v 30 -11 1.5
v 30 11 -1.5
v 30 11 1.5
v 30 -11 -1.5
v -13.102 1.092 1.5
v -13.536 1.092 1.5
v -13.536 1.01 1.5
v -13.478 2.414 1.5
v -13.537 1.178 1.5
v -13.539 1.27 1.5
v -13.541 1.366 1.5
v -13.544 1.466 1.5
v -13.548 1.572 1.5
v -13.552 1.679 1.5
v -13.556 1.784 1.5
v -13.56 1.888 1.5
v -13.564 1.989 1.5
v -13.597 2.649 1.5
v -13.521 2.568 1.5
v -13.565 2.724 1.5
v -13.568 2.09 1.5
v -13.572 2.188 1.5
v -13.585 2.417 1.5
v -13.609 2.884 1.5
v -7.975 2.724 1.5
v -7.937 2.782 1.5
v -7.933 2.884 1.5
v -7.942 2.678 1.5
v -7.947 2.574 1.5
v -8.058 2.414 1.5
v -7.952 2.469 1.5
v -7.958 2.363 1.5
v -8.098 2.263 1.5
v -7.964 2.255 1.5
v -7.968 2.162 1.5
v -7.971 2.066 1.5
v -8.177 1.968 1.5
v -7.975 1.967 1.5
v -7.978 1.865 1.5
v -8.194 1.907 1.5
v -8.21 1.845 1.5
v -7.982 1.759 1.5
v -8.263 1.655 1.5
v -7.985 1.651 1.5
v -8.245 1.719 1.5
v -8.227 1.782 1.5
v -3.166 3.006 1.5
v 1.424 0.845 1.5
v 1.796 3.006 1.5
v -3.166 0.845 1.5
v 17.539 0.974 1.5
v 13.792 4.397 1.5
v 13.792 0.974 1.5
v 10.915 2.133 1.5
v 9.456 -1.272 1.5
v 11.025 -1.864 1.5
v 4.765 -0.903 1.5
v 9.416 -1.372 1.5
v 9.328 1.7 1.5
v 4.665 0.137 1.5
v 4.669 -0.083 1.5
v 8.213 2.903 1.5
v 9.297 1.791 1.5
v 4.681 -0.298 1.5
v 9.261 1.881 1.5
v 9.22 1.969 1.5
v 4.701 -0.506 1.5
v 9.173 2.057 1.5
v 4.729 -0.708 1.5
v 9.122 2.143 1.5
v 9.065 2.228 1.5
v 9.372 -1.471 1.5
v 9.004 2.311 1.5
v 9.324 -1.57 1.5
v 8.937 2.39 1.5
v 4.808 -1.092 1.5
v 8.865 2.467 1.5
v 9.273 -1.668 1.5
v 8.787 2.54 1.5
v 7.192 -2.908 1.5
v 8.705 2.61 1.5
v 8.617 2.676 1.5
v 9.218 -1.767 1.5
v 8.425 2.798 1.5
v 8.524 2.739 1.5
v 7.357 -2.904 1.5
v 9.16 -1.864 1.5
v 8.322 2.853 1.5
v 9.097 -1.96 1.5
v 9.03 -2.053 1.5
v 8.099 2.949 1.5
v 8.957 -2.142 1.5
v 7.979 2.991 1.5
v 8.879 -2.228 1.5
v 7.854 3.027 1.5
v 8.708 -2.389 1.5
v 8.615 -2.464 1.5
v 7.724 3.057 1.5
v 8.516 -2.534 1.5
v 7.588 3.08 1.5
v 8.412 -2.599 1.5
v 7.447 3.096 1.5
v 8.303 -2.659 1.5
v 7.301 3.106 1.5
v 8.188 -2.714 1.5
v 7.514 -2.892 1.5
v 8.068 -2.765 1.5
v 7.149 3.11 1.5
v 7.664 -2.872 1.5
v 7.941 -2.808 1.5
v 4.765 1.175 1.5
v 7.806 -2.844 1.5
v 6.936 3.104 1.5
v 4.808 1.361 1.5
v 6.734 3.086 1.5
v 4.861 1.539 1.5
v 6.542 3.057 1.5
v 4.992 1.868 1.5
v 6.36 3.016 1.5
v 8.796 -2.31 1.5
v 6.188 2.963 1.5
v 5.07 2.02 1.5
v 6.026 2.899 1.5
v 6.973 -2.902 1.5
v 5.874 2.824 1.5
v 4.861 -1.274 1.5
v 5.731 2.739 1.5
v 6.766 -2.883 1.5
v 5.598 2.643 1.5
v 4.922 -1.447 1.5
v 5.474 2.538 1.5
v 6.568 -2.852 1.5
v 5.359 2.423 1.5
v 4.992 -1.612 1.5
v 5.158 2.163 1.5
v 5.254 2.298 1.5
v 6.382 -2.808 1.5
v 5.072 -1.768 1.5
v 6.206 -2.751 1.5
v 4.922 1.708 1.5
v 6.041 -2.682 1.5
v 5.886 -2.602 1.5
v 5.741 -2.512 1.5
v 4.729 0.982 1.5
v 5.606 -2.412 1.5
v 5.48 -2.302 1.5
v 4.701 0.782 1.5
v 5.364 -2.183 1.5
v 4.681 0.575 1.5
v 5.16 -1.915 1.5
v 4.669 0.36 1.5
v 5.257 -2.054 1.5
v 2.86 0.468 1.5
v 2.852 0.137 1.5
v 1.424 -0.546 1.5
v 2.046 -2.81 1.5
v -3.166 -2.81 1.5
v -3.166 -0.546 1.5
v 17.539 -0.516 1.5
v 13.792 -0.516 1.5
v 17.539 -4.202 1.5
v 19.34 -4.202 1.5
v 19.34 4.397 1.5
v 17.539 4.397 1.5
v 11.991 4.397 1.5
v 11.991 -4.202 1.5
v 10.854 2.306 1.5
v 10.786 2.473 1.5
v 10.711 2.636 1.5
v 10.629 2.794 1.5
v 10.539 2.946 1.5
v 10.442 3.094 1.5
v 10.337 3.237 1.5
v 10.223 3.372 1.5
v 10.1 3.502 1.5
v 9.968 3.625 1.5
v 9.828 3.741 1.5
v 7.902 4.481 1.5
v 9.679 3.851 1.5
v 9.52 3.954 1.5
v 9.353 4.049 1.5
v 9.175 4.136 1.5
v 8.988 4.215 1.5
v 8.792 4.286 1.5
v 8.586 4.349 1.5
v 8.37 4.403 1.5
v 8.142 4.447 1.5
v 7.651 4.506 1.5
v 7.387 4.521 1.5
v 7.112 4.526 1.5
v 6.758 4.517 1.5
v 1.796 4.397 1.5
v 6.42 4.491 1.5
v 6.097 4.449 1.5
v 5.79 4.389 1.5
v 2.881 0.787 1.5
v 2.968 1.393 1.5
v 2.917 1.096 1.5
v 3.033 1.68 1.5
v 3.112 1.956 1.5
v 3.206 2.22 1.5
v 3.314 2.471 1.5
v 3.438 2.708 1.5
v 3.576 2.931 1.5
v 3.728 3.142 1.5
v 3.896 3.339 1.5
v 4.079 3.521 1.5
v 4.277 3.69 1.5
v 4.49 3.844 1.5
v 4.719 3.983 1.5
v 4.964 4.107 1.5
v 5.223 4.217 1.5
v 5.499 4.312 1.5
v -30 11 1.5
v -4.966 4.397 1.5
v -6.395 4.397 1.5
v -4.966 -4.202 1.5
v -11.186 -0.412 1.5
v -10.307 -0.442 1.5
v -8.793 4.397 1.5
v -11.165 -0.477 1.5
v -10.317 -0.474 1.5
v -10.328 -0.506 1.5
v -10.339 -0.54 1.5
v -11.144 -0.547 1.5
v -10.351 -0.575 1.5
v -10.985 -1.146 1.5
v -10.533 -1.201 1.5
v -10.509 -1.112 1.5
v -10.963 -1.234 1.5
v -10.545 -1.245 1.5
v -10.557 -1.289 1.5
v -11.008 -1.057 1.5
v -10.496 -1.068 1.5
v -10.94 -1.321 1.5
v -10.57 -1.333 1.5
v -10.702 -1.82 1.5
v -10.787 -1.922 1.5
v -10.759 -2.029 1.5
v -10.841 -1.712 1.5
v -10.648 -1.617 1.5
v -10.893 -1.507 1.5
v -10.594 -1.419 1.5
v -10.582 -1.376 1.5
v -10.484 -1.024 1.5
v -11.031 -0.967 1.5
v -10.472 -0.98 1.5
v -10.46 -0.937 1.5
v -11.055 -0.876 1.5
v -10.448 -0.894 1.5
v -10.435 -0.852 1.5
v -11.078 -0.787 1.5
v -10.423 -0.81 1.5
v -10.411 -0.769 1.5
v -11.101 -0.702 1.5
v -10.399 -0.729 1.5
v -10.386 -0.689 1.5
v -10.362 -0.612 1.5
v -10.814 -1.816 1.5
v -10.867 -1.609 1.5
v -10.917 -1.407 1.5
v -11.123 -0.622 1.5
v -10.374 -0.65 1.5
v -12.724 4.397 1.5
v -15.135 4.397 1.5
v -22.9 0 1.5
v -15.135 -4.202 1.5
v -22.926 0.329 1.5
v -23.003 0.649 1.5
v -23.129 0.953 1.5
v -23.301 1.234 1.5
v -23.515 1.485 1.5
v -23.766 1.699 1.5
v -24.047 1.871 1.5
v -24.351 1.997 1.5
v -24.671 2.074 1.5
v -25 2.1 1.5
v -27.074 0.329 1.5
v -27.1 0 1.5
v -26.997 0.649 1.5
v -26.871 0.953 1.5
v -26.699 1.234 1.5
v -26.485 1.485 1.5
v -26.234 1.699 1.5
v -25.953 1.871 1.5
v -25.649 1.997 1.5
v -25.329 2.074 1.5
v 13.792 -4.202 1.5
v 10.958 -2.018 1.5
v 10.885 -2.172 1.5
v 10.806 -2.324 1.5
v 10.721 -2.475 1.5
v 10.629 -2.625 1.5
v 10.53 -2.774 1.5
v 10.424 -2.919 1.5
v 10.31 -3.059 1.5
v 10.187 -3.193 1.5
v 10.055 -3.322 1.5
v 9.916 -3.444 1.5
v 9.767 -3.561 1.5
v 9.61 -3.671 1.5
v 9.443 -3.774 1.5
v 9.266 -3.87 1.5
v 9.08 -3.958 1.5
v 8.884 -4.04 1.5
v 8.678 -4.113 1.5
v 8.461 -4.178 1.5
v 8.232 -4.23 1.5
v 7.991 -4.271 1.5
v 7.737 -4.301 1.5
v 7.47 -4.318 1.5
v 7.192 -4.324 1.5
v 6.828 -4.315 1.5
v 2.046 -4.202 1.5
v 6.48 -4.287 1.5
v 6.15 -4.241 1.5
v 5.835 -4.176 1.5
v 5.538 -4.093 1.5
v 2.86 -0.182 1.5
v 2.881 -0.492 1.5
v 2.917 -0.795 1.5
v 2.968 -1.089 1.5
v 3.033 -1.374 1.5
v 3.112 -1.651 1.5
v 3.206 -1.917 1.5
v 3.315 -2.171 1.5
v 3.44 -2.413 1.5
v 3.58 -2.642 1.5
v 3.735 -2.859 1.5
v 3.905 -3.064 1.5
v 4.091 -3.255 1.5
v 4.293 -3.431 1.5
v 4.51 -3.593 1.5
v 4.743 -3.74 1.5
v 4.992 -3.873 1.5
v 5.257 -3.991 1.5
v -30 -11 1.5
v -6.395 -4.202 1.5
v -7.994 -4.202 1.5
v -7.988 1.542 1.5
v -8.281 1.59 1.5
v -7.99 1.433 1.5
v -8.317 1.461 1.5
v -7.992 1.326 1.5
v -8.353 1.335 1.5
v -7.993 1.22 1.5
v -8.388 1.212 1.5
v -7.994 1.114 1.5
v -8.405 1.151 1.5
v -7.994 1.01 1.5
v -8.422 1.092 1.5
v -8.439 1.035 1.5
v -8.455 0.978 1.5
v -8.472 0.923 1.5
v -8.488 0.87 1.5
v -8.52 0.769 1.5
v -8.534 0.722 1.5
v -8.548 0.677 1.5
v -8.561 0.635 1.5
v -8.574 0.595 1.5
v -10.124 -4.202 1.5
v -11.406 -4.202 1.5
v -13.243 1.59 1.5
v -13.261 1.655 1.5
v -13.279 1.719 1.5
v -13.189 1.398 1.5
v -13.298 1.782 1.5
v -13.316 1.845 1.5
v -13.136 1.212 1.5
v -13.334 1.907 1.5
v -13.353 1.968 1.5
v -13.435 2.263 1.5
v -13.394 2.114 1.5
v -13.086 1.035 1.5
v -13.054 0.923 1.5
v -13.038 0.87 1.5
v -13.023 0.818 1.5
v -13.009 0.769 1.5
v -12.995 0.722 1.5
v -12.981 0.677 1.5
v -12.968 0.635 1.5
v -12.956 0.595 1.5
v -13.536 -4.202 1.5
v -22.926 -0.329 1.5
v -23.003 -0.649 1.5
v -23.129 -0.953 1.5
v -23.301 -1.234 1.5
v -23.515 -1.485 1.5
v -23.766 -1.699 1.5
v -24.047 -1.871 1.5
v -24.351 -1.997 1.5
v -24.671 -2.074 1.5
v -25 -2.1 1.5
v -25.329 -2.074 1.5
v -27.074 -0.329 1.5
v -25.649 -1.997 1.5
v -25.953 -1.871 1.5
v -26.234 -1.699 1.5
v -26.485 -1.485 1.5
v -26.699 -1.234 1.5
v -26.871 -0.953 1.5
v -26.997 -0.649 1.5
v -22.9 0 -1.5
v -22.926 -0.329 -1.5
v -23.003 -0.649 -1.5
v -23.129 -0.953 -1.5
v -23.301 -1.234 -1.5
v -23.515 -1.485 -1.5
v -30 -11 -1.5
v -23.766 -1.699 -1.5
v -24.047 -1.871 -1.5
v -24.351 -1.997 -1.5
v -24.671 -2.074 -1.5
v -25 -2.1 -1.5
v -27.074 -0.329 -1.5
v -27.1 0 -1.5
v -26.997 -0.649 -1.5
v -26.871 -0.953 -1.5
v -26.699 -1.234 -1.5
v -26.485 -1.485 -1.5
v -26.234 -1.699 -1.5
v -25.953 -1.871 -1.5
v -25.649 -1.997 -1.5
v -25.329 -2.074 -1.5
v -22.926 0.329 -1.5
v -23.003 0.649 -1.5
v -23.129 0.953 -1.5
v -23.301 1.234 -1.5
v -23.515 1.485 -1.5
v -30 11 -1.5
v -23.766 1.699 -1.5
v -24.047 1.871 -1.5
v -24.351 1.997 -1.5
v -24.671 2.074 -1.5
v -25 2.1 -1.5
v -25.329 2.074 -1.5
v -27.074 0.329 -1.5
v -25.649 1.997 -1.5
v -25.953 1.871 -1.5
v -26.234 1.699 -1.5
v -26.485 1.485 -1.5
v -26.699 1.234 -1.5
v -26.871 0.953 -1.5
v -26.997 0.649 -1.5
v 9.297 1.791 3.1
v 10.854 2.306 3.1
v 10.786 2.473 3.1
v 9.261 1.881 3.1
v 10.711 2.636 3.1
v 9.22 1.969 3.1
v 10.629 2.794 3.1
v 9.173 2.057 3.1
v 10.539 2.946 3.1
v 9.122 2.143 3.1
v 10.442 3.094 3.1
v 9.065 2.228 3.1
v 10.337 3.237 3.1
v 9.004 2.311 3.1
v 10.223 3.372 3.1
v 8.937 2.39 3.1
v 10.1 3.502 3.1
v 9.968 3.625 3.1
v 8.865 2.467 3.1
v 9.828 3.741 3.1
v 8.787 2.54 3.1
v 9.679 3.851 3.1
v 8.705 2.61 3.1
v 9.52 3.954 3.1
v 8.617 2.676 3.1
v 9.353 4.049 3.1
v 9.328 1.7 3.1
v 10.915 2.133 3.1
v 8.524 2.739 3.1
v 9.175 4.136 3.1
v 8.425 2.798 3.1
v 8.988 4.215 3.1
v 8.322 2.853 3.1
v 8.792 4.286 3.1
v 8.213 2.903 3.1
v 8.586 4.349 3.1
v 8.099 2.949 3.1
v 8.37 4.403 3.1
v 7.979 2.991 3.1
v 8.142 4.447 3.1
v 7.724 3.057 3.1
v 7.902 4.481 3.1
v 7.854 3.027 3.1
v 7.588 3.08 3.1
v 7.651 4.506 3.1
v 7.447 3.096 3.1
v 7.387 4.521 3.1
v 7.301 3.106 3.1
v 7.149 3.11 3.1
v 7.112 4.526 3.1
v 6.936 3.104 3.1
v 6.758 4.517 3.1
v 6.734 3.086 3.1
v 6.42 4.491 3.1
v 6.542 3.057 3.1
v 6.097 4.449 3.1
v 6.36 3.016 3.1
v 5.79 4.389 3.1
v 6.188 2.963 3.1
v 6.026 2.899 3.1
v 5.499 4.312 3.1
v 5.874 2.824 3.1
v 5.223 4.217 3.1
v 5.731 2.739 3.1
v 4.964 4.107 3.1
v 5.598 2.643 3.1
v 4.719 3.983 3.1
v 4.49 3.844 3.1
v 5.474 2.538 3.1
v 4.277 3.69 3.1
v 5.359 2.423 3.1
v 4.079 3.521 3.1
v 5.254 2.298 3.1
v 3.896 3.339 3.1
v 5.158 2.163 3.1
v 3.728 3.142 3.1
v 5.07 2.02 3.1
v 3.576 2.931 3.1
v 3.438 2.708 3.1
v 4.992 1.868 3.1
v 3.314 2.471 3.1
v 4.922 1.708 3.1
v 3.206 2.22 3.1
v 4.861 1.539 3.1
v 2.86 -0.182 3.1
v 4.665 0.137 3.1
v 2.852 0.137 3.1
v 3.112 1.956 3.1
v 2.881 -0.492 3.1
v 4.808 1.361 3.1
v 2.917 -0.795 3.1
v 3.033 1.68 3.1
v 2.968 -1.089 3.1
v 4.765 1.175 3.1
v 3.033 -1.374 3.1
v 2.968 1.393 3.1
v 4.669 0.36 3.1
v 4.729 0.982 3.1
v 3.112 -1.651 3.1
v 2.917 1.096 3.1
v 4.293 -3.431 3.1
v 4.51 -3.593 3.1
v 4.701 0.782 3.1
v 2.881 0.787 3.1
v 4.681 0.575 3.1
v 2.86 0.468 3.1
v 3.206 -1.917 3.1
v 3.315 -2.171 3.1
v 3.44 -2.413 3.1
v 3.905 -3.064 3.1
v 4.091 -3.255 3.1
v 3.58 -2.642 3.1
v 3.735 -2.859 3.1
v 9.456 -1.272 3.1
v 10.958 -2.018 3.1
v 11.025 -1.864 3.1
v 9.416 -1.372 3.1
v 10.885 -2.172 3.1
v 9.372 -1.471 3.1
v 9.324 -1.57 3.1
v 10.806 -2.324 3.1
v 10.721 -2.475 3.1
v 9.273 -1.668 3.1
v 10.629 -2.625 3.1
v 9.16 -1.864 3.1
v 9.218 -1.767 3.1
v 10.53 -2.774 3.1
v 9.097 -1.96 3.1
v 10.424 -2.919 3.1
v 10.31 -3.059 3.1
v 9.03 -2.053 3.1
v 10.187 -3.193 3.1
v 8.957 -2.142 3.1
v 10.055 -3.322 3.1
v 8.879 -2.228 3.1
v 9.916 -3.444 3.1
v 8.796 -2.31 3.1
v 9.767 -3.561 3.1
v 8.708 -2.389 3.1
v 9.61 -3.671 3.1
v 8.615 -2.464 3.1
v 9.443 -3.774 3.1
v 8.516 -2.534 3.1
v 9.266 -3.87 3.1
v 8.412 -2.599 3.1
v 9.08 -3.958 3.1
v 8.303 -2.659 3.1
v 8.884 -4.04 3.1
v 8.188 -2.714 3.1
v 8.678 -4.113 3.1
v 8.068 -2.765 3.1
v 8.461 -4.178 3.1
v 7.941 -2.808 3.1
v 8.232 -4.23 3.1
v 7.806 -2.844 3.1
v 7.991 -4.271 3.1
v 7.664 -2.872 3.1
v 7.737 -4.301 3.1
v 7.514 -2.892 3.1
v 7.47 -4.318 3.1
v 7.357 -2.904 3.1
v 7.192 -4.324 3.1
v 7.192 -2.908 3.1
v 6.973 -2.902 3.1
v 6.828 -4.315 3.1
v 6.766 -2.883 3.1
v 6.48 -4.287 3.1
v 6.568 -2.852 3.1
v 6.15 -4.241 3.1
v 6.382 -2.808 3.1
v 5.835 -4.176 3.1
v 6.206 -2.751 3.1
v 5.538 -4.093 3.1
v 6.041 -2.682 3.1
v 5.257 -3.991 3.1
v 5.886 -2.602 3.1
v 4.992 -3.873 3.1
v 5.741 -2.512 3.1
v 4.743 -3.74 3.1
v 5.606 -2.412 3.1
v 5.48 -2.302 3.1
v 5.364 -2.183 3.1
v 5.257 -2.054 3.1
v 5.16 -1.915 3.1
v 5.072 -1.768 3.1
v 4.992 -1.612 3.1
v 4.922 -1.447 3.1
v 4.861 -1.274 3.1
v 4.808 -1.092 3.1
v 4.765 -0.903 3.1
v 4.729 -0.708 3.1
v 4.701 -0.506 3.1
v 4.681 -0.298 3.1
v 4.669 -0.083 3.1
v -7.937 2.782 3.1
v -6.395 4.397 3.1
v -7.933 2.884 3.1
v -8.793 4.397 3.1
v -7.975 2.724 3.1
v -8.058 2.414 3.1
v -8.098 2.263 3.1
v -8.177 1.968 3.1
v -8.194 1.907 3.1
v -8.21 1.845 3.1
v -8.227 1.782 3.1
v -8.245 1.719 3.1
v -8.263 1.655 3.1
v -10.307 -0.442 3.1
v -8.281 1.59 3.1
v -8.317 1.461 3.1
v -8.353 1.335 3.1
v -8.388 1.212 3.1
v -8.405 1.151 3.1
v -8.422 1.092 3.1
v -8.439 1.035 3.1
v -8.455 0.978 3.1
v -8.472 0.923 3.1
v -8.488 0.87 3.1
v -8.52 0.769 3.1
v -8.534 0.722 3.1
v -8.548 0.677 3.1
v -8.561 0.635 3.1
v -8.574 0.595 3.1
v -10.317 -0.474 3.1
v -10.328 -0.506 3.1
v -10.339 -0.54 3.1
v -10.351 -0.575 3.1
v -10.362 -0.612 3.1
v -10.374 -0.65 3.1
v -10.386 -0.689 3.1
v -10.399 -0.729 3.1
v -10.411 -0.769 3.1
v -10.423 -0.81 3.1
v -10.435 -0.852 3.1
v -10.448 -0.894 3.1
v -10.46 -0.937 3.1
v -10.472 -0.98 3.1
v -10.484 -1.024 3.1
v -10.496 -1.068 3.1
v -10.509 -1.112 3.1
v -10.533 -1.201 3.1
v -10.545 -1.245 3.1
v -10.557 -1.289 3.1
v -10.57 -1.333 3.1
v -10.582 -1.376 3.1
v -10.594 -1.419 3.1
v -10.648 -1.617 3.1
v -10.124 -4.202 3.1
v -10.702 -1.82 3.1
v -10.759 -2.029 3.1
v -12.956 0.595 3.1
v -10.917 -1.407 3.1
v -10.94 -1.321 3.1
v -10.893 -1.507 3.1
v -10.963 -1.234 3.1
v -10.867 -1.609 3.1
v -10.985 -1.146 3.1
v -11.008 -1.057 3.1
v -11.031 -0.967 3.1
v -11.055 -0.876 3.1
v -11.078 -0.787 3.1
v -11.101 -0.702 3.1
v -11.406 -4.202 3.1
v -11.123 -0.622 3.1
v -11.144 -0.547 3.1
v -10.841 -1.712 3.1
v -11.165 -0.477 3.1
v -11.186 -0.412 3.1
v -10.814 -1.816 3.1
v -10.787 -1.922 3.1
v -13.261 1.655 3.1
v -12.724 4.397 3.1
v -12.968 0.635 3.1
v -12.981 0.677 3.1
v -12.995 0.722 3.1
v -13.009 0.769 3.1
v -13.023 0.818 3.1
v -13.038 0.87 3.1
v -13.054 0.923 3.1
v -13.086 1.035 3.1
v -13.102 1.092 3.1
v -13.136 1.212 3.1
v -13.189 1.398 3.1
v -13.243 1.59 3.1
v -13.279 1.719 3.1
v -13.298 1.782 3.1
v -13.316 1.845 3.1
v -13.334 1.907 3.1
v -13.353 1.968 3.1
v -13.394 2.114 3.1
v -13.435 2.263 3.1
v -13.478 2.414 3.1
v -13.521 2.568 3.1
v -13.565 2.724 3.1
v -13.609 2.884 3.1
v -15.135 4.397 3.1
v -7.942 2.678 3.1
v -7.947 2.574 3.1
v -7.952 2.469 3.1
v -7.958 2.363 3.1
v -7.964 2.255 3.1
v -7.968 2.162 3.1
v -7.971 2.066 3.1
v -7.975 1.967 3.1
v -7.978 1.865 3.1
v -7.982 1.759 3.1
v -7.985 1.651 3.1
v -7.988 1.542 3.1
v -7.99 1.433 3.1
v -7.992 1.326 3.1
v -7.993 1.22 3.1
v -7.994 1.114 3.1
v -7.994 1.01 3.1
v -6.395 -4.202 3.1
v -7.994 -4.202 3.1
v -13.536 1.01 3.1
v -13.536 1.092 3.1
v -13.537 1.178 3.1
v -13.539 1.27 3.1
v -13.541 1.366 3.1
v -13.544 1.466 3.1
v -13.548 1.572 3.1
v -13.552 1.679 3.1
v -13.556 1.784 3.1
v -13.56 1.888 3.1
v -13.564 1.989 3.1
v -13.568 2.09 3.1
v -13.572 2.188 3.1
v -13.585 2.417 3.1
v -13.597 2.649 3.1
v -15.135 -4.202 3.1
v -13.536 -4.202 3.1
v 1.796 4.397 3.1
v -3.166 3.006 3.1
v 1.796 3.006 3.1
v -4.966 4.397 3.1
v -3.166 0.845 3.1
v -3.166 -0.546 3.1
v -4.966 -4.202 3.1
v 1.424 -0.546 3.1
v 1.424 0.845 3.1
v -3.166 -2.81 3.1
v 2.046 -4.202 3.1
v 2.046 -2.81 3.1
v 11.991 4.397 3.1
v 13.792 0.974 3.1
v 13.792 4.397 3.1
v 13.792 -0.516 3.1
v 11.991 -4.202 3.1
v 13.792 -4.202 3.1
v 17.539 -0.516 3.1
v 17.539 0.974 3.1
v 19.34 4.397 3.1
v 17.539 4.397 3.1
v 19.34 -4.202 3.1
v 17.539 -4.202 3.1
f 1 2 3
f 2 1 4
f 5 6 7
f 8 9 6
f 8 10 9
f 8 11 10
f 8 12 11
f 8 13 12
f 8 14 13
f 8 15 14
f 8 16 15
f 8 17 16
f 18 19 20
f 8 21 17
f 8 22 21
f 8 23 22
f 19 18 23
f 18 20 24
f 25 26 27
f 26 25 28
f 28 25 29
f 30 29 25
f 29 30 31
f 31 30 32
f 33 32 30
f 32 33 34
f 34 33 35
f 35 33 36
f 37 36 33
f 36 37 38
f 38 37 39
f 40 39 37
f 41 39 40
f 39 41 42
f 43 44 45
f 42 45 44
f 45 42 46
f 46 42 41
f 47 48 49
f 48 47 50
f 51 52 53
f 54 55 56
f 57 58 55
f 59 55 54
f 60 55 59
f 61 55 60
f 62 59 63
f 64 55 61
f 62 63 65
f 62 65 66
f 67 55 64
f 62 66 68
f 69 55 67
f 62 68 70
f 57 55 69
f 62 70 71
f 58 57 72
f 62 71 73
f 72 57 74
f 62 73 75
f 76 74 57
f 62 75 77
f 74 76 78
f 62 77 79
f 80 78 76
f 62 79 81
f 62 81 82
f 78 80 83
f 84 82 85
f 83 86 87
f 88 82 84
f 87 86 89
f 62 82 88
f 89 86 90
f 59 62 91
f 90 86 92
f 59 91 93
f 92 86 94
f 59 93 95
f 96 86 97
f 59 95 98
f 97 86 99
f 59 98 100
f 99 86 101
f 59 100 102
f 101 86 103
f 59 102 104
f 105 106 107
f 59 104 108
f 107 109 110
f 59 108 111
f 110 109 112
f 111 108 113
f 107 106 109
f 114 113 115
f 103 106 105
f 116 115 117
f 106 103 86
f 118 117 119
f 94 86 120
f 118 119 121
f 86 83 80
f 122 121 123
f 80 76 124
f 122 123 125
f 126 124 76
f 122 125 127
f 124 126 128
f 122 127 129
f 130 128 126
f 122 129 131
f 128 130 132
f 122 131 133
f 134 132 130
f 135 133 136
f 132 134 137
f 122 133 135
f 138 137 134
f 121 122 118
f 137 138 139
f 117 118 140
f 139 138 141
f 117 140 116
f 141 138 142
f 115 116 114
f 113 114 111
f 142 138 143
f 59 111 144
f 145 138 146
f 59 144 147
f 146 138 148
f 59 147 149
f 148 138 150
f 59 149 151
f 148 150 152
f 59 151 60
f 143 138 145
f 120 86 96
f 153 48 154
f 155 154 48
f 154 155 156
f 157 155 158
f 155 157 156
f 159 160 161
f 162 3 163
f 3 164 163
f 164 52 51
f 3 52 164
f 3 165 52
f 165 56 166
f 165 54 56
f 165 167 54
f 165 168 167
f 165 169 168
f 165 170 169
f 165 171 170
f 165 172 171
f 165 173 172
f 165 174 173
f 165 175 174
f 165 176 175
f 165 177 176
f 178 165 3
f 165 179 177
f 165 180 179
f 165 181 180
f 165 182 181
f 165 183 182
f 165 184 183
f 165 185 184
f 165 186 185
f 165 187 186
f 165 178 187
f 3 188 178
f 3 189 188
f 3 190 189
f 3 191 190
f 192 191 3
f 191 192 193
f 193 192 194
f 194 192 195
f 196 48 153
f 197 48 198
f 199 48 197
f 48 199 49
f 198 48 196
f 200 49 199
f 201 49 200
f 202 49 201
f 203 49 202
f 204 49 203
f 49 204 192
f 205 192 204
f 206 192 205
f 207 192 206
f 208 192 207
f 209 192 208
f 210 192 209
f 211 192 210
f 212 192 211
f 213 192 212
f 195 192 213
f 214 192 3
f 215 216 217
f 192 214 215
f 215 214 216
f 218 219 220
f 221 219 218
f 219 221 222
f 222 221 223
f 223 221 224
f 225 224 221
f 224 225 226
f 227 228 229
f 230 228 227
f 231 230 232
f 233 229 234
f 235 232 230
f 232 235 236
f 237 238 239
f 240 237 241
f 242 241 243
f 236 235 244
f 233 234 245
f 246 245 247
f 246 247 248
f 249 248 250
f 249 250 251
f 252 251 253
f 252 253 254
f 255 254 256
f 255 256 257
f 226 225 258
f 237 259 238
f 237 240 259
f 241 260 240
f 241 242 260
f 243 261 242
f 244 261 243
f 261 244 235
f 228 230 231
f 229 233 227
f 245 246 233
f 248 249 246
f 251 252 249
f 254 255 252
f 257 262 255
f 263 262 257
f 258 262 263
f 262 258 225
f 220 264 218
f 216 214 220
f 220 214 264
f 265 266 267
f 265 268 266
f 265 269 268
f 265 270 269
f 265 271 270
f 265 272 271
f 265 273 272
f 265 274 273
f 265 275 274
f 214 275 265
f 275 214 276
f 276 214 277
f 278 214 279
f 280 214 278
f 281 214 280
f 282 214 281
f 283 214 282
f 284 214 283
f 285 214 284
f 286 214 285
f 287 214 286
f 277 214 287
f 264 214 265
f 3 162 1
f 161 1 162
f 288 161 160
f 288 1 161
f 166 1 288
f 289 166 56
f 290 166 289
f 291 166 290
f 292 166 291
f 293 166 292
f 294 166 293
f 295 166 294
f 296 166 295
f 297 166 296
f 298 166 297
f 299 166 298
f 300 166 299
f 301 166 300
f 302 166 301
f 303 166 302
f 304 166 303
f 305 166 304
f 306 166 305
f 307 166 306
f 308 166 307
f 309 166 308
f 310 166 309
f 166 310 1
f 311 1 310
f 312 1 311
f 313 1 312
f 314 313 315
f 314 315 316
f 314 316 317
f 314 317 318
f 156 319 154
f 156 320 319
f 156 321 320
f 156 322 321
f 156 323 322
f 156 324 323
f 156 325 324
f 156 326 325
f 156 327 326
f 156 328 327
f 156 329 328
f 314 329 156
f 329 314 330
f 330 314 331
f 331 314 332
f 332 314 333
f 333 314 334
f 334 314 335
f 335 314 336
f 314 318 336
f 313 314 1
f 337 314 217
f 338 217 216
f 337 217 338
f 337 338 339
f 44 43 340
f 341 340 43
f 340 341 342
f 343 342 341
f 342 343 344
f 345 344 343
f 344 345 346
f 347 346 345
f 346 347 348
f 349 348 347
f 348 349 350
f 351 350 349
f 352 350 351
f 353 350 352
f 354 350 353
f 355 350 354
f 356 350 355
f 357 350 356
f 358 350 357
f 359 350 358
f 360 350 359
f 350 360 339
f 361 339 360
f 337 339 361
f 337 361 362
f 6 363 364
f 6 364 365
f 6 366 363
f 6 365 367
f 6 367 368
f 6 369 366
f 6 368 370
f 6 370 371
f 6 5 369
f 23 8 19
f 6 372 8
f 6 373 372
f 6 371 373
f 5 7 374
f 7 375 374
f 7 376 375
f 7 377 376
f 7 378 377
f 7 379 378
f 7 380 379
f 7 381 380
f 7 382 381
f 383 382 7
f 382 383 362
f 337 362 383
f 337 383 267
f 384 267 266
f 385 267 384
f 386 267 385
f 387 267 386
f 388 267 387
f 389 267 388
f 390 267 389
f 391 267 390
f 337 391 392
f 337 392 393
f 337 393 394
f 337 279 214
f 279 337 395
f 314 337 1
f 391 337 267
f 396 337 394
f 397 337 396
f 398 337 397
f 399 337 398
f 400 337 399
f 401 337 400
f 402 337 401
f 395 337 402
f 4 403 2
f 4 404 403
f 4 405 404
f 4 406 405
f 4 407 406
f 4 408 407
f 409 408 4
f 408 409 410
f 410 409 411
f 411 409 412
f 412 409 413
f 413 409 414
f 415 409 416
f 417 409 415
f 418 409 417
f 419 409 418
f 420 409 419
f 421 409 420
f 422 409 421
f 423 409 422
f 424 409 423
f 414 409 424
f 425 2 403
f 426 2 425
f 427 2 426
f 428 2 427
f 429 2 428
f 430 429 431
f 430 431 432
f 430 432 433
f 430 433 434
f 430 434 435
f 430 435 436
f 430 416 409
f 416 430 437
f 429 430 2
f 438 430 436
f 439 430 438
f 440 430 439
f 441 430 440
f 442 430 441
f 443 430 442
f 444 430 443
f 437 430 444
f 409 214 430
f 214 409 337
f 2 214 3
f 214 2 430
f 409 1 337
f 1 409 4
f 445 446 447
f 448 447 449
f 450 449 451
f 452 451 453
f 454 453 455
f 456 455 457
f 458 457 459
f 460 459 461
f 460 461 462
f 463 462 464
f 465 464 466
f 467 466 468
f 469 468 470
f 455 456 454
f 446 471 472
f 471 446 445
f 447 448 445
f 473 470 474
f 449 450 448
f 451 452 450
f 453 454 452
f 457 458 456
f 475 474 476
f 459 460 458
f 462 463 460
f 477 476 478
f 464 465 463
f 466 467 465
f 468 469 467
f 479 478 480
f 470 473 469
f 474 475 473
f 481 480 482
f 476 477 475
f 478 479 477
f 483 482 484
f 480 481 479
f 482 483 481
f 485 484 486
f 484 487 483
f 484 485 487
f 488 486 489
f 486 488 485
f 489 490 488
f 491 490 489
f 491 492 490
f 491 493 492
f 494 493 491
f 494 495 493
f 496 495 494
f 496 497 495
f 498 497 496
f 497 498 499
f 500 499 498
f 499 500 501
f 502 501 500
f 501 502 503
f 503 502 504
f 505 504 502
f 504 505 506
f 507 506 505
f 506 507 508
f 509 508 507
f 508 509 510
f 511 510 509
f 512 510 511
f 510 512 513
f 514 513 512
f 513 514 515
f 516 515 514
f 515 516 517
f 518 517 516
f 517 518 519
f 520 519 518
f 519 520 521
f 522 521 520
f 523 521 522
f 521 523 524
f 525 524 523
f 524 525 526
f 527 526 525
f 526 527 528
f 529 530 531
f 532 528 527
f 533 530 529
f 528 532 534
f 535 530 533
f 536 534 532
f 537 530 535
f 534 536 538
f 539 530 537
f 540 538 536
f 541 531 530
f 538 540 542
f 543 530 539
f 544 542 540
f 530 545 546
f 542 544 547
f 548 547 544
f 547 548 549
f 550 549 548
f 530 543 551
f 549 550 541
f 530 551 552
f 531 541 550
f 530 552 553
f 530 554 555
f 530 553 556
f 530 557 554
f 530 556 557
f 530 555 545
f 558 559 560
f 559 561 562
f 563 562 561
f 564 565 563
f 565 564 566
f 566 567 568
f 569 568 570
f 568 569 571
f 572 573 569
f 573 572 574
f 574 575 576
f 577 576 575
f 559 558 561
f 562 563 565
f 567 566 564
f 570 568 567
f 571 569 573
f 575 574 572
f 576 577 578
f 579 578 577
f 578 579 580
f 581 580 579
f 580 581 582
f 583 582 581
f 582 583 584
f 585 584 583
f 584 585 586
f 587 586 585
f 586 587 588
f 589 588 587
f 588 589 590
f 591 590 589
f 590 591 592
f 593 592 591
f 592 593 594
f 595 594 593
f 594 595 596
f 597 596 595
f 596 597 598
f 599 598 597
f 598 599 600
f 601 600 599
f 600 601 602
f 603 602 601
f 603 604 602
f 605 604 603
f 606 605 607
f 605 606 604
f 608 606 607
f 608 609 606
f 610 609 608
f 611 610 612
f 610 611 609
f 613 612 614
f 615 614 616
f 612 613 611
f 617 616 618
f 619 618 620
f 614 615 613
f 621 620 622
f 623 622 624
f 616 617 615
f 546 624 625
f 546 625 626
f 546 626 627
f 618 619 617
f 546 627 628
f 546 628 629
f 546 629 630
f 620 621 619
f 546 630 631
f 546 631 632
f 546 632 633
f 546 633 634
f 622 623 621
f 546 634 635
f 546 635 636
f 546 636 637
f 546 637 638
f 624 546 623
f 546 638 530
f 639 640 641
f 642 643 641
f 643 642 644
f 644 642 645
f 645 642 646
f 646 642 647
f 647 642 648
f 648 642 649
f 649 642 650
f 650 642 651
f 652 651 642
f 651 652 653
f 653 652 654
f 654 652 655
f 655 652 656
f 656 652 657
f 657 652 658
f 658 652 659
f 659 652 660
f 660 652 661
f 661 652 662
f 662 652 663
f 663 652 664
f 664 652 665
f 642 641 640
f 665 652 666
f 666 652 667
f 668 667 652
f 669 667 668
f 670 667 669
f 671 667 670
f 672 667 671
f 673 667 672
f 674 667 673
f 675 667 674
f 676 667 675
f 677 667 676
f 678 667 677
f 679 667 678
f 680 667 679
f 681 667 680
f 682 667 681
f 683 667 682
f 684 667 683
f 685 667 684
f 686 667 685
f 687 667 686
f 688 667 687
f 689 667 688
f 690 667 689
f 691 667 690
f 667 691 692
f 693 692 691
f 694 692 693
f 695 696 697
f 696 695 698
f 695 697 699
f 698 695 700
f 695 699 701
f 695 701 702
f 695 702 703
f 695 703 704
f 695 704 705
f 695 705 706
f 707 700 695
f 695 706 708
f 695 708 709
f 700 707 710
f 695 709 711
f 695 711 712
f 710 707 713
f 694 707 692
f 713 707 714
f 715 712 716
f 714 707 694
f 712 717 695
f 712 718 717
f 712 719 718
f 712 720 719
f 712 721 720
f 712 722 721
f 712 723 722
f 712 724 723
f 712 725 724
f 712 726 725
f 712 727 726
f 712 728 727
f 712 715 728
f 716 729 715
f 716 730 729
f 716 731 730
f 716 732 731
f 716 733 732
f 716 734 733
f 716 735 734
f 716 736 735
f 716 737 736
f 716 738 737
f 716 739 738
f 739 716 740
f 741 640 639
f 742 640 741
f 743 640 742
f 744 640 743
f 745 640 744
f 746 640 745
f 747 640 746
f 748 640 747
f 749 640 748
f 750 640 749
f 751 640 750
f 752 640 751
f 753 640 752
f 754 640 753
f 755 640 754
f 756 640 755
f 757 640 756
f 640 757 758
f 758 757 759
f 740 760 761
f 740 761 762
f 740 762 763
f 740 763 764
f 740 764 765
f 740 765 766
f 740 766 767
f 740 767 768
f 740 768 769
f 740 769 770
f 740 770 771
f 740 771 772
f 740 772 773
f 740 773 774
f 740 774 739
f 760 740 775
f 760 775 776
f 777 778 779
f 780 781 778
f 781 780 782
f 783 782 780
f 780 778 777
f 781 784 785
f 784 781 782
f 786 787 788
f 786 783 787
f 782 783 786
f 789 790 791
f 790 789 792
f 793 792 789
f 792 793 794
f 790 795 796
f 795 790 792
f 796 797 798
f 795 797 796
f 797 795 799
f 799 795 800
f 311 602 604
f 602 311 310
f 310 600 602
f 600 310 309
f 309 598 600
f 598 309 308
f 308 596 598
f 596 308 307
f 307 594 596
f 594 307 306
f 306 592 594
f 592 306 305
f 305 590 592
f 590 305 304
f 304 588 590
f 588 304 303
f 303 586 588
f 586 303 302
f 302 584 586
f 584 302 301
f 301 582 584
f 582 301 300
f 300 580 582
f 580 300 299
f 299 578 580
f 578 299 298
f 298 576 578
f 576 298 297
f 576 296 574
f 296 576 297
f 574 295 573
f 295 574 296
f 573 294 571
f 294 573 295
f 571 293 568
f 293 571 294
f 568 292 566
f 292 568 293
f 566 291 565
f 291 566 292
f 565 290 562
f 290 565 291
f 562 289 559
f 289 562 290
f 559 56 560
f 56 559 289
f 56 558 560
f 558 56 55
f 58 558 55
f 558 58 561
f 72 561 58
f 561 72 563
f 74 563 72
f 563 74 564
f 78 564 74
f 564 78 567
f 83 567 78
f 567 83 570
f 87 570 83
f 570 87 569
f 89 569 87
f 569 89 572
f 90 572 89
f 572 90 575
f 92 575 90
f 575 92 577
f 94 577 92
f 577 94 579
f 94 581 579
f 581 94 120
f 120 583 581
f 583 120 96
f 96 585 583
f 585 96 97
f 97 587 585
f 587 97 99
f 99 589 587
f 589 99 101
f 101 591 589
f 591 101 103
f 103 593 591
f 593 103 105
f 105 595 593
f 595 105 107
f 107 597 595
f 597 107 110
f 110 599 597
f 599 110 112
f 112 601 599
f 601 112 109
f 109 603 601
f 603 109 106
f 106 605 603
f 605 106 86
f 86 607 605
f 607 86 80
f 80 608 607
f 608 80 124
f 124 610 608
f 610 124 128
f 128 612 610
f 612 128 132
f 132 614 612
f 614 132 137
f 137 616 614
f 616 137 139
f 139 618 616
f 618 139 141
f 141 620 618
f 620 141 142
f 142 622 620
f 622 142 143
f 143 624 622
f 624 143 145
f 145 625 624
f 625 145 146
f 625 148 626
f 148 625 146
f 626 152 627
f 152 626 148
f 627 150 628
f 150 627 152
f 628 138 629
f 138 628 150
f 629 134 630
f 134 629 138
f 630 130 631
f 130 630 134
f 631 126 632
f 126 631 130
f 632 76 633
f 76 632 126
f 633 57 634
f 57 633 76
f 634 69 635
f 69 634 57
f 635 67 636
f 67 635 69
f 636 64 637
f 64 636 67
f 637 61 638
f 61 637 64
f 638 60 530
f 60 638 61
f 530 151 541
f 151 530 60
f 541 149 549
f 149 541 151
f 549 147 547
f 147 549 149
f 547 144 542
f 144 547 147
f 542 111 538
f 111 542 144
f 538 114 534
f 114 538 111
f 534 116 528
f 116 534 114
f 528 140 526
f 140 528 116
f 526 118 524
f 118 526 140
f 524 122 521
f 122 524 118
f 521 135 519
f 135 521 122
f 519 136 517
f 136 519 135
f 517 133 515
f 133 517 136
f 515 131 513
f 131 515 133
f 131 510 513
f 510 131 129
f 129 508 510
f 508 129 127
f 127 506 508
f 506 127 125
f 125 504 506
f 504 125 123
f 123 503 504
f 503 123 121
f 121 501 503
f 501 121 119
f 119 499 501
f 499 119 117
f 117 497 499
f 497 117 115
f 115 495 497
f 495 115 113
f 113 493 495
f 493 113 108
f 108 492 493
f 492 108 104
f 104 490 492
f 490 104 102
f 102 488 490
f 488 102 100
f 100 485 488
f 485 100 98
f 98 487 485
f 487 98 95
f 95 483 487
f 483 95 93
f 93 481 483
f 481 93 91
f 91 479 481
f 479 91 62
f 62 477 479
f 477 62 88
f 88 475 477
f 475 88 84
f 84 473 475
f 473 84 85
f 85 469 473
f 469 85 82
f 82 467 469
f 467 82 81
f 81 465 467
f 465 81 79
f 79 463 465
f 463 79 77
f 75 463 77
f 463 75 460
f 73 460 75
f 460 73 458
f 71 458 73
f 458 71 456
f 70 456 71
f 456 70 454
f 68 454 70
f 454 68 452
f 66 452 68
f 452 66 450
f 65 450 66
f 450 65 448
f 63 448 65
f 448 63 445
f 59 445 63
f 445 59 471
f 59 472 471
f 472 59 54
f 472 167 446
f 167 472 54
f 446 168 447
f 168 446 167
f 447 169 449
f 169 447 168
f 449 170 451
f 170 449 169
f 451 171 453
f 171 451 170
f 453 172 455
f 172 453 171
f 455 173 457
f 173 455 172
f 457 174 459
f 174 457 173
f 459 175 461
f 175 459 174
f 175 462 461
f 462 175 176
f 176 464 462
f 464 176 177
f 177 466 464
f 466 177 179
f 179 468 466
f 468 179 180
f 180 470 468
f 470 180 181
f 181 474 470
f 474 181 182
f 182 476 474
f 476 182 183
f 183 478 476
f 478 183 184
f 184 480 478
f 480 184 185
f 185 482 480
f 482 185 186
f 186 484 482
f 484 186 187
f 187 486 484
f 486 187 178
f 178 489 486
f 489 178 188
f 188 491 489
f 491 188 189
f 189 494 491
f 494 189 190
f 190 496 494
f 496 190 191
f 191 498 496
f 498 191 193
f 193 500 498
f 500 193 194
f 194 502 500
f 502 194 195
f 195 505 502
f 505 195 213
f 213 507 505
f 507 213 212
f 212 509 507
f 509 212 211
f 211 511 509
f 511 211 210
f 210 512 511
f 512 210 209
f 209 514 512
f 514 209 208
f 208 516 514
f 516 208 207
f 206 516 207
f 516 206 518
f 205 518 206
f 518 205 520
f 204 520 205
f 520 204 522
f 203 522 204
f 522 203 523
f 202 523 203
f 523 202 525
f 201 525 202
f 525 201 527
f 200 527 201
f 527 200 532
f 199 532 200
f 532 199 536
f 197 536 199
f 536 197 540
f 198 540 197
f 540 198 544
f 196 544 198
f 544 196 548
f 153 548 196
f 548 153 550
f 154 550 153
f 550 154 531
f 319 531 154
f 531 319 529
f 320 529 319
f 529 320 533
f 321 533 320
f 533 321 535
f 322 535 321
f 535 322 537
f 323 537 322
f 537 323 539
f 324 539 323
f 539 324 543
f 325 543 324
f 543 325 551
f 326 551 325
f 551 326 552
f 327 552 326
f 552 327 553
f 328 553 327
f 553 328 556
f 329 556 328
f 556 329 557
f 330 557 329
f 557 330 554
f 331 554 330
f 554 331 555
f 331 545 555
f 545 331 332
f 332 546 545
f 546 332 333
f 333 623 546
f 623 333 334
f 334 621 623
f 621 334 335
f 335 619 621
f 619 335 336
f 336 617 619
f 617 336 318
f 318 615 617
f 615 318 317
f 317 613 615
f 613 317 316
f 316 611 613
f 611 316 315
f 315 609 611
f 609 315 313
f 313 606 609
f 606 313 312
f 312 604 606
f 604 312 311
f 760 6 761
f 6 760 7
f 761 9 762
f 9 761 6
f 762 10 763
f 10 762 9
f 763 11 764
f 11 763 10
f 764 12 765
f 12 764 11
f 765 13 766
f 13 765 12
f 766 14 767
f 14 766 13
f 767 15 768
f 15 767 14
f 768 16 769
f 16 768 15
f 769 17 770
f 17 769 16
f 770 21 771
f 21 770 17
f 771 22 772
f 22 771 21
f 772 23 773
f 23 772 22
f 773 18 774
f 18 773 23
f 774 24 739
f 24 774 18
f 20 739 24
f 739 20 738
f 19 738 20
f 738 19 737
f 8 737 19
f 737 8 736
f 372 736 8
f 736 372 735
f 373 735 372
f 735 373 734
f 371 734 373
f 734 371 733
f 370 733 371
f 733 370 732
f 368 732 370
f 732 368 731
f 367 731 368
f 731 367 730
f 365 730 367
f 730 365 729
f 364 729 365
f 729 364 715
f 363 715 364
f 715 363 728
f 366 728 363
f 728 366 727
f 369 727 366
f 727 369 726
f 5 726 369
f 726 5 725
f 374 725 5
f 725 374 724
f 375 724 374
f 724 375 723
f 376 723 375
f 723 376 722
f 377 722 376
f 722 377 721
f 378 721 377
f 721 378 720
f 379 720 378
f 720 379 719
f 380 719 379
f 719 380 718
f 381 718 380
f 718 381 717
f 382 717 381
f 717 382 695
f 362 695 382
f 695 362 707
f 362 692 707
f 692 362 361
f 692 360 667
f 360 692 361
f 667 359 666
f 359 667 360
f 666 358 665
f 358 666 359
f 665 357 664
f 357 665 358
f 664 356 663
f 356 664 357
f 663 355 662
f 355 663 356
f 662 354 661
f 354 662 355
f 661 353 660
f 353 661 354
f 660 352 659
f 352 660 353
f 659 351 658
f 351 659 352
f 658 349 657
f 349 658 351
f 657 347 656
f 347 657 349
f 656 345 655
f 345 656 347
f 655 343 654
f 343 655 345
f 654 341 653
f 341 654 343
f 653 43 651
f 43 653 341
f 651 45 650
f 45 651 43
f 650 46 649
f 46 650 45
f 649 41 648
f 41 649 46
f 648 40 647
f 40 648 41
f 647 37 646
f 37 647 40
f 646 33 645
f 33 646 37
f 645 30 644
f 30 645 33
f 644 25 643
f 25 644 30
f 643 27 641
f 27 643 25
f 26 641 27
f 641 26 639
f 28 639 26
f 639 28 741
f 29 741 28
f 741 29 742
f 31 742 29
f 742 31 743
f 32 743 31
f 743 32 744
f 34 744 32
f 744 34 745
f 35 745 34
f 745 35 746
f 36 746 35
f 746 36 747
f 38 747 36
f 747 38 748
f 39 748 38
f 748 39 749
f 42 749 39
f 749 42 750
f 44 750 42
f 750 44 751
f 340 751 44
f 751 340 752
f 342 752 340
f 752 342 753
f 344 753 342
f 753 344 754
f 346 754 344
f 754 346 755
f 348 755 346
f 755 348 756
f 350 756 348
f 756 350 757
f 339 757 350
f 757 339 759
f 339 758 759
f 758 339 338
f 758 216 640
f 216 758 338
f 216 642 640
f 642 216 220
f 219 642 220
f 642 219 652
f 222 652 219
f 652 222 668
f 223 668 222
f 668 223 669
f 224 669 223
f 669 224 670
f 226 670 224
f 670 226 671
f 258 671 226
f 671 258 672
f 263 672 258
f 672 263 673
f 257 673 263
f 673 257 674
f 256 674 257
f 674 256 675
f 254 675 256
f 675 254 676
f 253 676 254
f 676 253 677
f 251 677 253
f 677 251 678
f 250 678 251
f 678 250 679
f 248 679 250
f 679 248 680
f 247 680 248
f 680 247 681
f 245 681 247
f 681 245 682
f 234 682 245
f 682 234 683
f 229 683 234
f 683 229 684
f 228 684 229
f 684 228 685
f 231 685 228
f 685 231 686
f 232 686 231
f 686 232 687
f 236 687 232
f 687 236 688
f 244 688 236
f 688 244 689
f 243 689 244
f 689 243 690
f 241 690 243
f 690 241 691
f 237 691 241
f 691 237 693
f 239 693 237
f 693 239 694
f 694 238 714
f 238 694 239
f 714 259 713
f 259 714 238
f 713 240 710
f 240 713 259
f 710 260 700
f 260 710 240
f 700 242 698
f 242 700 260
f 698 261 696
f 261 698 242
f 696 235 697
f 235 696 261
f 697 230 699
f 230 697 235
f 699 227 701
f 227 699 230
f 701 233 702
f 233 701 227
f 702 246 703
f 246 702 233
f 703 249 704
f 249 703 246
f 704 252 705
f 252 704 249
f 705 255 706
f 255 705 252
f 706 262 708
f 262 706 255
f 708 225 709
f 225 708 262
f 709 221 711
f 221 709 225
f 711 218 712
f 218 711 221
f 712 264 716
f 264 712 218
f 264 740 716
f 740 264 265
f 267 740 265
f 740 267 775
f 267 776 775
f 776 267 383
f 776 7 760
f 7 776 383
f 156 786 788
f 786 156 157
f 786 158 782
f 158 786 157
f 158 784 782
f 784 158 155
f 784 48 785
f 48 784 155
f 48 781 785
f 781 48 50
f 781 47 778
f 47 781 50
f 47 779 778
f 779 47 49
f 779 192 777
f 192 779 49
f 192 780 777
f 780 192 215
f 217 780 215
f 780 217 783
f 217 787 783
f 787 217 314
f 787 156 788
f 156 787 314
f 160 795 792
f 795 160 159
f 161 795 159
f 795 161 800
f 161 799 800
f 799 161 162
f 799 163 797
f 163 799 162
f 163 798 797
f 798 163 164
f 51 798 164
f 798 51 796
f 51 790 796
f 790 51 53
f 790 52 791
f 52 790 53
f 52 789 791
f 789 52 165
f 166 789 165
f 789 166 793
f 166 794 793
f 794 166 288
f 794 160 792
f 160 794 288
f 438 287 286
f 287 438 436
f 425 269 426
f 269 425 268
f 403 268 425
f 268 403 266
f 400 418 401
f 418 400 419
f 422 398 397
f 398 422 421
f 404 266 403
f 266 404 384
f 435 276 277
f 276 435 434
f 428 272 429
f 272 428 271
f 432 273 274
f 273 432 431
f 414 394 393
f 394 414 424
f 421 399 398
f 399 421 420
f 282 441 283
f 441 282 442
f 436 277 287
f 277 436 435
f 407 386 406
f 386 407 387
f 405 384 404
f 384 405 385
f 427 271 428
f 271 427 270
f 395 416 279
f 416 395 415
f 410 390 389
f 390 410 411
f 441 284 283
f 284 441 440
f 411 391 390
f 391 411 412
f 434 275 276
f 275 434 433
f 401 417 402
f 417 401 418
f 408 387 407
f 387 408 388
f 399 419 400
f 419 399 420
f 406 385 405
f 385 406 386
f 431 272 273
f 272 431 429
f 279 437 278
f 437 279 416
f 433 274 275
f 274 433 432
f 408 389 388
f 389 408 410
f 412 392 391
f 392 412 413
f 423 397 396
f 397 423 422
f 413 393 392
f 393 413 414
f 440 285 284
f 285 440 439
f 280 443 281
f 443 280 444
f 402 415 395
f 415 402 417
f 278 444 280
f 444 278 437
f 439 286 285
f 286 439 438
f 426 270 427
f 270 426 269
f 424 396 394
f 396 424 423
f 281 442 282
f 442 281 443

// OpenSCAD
// Checkpoint 1a - Nameplate / keychain.
// A base plate, raised text, and one mounting hole placed by number.
$fn = 40;
difference() {
  union() {
    cube([60, 22, 3], center = true);
    translate([2, 0, 1.5])
      linear_extrude(1.6)
        text("MECH", size = 9, halign = "center", valign = "center", font = "Liberation Sans:style=Bold");
  }
  translate([-25, 0, 0]) cylinder(h = 10, r = 2.1, center = true);
}
